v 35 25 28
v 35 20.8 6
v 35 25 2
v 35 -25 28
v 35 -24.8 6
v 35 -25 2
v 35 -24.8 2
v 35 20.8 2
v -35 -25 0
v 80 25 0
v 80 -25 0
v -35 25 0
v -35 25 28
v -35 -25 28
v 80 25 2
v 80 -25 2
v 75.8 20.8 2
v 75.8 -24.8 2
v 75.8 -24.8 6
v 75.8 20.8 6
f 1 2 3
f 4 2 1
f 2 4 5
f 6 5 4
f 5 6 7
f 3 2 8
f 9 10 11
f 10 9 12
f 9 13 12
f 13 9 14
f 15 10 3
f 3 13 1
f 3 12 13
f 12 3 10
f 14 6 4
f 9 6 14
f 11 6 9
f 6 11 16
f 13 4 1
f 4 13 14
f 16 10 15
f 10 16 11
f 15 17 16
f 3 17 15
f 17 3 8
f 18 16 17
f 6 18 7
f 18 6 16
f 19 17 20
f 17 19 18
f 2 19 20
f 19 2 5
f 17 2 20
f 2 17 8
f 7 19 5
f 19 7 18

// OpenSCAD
// Two-part enclosure for a small electronics board (e.g. Arduino-based temperature logger)
// Print orientation: both parts lie on the bed (z = 0), side by side, with a 10 mm gap.
// They print together as one solid.

// ---------------- Parameters ----------------
box_x      = 70;    // box outer length (X)
box_y      = 50;    // box outer width (Y)
box_z      = 30;    // box outer height (Z)
wall       = 2;     // box wall thickness
floor      = 2;     // box floor thickness
lip_t      = 1.5;   // lid lip wall thickness
lip_h      = 4;     // lid lip height (from top of plate)
lip_outer_x = 65.6; // outer size of lip in X
lip_outer_y = 45.6; // outer size of lip in Y
clearance  = 0.2;   // clearance between lip outer size and box opening
eps        = 0.5;   // overcut for clean boolean differences
gap        = 10;    // gap between the two printed parts

$fn = 64;

// ---------------- Modules ----------------
module box() {
    difference() {
        translate([-box_x/2, -box_y/2, 0])
            cube([box_x, box_y, box_z]);
        // open top: cut a channel through the top wall
        translate([-box_x/2, -box_y/2, box_z - floor])
            cube([box_x, box_y, floor + eps]);
    }
}

module lid() {
    // Plate lying on the bed
    translate([-box_x/2, -box_y/2, 0])
        cube([box_x, box_y, 2]);
    // Lip on top of the plate, centred on it
    translate([-box_x/2 + clearance, -box_y/2 + clearance, 2])
        cube([lip_outer_x, lip_outer_y, lip_h]);
}

// ---------------- Assembly ----------------
union() {
    box();
    translate([box_x/2 + gap, 0, 0])
        lid();
}
